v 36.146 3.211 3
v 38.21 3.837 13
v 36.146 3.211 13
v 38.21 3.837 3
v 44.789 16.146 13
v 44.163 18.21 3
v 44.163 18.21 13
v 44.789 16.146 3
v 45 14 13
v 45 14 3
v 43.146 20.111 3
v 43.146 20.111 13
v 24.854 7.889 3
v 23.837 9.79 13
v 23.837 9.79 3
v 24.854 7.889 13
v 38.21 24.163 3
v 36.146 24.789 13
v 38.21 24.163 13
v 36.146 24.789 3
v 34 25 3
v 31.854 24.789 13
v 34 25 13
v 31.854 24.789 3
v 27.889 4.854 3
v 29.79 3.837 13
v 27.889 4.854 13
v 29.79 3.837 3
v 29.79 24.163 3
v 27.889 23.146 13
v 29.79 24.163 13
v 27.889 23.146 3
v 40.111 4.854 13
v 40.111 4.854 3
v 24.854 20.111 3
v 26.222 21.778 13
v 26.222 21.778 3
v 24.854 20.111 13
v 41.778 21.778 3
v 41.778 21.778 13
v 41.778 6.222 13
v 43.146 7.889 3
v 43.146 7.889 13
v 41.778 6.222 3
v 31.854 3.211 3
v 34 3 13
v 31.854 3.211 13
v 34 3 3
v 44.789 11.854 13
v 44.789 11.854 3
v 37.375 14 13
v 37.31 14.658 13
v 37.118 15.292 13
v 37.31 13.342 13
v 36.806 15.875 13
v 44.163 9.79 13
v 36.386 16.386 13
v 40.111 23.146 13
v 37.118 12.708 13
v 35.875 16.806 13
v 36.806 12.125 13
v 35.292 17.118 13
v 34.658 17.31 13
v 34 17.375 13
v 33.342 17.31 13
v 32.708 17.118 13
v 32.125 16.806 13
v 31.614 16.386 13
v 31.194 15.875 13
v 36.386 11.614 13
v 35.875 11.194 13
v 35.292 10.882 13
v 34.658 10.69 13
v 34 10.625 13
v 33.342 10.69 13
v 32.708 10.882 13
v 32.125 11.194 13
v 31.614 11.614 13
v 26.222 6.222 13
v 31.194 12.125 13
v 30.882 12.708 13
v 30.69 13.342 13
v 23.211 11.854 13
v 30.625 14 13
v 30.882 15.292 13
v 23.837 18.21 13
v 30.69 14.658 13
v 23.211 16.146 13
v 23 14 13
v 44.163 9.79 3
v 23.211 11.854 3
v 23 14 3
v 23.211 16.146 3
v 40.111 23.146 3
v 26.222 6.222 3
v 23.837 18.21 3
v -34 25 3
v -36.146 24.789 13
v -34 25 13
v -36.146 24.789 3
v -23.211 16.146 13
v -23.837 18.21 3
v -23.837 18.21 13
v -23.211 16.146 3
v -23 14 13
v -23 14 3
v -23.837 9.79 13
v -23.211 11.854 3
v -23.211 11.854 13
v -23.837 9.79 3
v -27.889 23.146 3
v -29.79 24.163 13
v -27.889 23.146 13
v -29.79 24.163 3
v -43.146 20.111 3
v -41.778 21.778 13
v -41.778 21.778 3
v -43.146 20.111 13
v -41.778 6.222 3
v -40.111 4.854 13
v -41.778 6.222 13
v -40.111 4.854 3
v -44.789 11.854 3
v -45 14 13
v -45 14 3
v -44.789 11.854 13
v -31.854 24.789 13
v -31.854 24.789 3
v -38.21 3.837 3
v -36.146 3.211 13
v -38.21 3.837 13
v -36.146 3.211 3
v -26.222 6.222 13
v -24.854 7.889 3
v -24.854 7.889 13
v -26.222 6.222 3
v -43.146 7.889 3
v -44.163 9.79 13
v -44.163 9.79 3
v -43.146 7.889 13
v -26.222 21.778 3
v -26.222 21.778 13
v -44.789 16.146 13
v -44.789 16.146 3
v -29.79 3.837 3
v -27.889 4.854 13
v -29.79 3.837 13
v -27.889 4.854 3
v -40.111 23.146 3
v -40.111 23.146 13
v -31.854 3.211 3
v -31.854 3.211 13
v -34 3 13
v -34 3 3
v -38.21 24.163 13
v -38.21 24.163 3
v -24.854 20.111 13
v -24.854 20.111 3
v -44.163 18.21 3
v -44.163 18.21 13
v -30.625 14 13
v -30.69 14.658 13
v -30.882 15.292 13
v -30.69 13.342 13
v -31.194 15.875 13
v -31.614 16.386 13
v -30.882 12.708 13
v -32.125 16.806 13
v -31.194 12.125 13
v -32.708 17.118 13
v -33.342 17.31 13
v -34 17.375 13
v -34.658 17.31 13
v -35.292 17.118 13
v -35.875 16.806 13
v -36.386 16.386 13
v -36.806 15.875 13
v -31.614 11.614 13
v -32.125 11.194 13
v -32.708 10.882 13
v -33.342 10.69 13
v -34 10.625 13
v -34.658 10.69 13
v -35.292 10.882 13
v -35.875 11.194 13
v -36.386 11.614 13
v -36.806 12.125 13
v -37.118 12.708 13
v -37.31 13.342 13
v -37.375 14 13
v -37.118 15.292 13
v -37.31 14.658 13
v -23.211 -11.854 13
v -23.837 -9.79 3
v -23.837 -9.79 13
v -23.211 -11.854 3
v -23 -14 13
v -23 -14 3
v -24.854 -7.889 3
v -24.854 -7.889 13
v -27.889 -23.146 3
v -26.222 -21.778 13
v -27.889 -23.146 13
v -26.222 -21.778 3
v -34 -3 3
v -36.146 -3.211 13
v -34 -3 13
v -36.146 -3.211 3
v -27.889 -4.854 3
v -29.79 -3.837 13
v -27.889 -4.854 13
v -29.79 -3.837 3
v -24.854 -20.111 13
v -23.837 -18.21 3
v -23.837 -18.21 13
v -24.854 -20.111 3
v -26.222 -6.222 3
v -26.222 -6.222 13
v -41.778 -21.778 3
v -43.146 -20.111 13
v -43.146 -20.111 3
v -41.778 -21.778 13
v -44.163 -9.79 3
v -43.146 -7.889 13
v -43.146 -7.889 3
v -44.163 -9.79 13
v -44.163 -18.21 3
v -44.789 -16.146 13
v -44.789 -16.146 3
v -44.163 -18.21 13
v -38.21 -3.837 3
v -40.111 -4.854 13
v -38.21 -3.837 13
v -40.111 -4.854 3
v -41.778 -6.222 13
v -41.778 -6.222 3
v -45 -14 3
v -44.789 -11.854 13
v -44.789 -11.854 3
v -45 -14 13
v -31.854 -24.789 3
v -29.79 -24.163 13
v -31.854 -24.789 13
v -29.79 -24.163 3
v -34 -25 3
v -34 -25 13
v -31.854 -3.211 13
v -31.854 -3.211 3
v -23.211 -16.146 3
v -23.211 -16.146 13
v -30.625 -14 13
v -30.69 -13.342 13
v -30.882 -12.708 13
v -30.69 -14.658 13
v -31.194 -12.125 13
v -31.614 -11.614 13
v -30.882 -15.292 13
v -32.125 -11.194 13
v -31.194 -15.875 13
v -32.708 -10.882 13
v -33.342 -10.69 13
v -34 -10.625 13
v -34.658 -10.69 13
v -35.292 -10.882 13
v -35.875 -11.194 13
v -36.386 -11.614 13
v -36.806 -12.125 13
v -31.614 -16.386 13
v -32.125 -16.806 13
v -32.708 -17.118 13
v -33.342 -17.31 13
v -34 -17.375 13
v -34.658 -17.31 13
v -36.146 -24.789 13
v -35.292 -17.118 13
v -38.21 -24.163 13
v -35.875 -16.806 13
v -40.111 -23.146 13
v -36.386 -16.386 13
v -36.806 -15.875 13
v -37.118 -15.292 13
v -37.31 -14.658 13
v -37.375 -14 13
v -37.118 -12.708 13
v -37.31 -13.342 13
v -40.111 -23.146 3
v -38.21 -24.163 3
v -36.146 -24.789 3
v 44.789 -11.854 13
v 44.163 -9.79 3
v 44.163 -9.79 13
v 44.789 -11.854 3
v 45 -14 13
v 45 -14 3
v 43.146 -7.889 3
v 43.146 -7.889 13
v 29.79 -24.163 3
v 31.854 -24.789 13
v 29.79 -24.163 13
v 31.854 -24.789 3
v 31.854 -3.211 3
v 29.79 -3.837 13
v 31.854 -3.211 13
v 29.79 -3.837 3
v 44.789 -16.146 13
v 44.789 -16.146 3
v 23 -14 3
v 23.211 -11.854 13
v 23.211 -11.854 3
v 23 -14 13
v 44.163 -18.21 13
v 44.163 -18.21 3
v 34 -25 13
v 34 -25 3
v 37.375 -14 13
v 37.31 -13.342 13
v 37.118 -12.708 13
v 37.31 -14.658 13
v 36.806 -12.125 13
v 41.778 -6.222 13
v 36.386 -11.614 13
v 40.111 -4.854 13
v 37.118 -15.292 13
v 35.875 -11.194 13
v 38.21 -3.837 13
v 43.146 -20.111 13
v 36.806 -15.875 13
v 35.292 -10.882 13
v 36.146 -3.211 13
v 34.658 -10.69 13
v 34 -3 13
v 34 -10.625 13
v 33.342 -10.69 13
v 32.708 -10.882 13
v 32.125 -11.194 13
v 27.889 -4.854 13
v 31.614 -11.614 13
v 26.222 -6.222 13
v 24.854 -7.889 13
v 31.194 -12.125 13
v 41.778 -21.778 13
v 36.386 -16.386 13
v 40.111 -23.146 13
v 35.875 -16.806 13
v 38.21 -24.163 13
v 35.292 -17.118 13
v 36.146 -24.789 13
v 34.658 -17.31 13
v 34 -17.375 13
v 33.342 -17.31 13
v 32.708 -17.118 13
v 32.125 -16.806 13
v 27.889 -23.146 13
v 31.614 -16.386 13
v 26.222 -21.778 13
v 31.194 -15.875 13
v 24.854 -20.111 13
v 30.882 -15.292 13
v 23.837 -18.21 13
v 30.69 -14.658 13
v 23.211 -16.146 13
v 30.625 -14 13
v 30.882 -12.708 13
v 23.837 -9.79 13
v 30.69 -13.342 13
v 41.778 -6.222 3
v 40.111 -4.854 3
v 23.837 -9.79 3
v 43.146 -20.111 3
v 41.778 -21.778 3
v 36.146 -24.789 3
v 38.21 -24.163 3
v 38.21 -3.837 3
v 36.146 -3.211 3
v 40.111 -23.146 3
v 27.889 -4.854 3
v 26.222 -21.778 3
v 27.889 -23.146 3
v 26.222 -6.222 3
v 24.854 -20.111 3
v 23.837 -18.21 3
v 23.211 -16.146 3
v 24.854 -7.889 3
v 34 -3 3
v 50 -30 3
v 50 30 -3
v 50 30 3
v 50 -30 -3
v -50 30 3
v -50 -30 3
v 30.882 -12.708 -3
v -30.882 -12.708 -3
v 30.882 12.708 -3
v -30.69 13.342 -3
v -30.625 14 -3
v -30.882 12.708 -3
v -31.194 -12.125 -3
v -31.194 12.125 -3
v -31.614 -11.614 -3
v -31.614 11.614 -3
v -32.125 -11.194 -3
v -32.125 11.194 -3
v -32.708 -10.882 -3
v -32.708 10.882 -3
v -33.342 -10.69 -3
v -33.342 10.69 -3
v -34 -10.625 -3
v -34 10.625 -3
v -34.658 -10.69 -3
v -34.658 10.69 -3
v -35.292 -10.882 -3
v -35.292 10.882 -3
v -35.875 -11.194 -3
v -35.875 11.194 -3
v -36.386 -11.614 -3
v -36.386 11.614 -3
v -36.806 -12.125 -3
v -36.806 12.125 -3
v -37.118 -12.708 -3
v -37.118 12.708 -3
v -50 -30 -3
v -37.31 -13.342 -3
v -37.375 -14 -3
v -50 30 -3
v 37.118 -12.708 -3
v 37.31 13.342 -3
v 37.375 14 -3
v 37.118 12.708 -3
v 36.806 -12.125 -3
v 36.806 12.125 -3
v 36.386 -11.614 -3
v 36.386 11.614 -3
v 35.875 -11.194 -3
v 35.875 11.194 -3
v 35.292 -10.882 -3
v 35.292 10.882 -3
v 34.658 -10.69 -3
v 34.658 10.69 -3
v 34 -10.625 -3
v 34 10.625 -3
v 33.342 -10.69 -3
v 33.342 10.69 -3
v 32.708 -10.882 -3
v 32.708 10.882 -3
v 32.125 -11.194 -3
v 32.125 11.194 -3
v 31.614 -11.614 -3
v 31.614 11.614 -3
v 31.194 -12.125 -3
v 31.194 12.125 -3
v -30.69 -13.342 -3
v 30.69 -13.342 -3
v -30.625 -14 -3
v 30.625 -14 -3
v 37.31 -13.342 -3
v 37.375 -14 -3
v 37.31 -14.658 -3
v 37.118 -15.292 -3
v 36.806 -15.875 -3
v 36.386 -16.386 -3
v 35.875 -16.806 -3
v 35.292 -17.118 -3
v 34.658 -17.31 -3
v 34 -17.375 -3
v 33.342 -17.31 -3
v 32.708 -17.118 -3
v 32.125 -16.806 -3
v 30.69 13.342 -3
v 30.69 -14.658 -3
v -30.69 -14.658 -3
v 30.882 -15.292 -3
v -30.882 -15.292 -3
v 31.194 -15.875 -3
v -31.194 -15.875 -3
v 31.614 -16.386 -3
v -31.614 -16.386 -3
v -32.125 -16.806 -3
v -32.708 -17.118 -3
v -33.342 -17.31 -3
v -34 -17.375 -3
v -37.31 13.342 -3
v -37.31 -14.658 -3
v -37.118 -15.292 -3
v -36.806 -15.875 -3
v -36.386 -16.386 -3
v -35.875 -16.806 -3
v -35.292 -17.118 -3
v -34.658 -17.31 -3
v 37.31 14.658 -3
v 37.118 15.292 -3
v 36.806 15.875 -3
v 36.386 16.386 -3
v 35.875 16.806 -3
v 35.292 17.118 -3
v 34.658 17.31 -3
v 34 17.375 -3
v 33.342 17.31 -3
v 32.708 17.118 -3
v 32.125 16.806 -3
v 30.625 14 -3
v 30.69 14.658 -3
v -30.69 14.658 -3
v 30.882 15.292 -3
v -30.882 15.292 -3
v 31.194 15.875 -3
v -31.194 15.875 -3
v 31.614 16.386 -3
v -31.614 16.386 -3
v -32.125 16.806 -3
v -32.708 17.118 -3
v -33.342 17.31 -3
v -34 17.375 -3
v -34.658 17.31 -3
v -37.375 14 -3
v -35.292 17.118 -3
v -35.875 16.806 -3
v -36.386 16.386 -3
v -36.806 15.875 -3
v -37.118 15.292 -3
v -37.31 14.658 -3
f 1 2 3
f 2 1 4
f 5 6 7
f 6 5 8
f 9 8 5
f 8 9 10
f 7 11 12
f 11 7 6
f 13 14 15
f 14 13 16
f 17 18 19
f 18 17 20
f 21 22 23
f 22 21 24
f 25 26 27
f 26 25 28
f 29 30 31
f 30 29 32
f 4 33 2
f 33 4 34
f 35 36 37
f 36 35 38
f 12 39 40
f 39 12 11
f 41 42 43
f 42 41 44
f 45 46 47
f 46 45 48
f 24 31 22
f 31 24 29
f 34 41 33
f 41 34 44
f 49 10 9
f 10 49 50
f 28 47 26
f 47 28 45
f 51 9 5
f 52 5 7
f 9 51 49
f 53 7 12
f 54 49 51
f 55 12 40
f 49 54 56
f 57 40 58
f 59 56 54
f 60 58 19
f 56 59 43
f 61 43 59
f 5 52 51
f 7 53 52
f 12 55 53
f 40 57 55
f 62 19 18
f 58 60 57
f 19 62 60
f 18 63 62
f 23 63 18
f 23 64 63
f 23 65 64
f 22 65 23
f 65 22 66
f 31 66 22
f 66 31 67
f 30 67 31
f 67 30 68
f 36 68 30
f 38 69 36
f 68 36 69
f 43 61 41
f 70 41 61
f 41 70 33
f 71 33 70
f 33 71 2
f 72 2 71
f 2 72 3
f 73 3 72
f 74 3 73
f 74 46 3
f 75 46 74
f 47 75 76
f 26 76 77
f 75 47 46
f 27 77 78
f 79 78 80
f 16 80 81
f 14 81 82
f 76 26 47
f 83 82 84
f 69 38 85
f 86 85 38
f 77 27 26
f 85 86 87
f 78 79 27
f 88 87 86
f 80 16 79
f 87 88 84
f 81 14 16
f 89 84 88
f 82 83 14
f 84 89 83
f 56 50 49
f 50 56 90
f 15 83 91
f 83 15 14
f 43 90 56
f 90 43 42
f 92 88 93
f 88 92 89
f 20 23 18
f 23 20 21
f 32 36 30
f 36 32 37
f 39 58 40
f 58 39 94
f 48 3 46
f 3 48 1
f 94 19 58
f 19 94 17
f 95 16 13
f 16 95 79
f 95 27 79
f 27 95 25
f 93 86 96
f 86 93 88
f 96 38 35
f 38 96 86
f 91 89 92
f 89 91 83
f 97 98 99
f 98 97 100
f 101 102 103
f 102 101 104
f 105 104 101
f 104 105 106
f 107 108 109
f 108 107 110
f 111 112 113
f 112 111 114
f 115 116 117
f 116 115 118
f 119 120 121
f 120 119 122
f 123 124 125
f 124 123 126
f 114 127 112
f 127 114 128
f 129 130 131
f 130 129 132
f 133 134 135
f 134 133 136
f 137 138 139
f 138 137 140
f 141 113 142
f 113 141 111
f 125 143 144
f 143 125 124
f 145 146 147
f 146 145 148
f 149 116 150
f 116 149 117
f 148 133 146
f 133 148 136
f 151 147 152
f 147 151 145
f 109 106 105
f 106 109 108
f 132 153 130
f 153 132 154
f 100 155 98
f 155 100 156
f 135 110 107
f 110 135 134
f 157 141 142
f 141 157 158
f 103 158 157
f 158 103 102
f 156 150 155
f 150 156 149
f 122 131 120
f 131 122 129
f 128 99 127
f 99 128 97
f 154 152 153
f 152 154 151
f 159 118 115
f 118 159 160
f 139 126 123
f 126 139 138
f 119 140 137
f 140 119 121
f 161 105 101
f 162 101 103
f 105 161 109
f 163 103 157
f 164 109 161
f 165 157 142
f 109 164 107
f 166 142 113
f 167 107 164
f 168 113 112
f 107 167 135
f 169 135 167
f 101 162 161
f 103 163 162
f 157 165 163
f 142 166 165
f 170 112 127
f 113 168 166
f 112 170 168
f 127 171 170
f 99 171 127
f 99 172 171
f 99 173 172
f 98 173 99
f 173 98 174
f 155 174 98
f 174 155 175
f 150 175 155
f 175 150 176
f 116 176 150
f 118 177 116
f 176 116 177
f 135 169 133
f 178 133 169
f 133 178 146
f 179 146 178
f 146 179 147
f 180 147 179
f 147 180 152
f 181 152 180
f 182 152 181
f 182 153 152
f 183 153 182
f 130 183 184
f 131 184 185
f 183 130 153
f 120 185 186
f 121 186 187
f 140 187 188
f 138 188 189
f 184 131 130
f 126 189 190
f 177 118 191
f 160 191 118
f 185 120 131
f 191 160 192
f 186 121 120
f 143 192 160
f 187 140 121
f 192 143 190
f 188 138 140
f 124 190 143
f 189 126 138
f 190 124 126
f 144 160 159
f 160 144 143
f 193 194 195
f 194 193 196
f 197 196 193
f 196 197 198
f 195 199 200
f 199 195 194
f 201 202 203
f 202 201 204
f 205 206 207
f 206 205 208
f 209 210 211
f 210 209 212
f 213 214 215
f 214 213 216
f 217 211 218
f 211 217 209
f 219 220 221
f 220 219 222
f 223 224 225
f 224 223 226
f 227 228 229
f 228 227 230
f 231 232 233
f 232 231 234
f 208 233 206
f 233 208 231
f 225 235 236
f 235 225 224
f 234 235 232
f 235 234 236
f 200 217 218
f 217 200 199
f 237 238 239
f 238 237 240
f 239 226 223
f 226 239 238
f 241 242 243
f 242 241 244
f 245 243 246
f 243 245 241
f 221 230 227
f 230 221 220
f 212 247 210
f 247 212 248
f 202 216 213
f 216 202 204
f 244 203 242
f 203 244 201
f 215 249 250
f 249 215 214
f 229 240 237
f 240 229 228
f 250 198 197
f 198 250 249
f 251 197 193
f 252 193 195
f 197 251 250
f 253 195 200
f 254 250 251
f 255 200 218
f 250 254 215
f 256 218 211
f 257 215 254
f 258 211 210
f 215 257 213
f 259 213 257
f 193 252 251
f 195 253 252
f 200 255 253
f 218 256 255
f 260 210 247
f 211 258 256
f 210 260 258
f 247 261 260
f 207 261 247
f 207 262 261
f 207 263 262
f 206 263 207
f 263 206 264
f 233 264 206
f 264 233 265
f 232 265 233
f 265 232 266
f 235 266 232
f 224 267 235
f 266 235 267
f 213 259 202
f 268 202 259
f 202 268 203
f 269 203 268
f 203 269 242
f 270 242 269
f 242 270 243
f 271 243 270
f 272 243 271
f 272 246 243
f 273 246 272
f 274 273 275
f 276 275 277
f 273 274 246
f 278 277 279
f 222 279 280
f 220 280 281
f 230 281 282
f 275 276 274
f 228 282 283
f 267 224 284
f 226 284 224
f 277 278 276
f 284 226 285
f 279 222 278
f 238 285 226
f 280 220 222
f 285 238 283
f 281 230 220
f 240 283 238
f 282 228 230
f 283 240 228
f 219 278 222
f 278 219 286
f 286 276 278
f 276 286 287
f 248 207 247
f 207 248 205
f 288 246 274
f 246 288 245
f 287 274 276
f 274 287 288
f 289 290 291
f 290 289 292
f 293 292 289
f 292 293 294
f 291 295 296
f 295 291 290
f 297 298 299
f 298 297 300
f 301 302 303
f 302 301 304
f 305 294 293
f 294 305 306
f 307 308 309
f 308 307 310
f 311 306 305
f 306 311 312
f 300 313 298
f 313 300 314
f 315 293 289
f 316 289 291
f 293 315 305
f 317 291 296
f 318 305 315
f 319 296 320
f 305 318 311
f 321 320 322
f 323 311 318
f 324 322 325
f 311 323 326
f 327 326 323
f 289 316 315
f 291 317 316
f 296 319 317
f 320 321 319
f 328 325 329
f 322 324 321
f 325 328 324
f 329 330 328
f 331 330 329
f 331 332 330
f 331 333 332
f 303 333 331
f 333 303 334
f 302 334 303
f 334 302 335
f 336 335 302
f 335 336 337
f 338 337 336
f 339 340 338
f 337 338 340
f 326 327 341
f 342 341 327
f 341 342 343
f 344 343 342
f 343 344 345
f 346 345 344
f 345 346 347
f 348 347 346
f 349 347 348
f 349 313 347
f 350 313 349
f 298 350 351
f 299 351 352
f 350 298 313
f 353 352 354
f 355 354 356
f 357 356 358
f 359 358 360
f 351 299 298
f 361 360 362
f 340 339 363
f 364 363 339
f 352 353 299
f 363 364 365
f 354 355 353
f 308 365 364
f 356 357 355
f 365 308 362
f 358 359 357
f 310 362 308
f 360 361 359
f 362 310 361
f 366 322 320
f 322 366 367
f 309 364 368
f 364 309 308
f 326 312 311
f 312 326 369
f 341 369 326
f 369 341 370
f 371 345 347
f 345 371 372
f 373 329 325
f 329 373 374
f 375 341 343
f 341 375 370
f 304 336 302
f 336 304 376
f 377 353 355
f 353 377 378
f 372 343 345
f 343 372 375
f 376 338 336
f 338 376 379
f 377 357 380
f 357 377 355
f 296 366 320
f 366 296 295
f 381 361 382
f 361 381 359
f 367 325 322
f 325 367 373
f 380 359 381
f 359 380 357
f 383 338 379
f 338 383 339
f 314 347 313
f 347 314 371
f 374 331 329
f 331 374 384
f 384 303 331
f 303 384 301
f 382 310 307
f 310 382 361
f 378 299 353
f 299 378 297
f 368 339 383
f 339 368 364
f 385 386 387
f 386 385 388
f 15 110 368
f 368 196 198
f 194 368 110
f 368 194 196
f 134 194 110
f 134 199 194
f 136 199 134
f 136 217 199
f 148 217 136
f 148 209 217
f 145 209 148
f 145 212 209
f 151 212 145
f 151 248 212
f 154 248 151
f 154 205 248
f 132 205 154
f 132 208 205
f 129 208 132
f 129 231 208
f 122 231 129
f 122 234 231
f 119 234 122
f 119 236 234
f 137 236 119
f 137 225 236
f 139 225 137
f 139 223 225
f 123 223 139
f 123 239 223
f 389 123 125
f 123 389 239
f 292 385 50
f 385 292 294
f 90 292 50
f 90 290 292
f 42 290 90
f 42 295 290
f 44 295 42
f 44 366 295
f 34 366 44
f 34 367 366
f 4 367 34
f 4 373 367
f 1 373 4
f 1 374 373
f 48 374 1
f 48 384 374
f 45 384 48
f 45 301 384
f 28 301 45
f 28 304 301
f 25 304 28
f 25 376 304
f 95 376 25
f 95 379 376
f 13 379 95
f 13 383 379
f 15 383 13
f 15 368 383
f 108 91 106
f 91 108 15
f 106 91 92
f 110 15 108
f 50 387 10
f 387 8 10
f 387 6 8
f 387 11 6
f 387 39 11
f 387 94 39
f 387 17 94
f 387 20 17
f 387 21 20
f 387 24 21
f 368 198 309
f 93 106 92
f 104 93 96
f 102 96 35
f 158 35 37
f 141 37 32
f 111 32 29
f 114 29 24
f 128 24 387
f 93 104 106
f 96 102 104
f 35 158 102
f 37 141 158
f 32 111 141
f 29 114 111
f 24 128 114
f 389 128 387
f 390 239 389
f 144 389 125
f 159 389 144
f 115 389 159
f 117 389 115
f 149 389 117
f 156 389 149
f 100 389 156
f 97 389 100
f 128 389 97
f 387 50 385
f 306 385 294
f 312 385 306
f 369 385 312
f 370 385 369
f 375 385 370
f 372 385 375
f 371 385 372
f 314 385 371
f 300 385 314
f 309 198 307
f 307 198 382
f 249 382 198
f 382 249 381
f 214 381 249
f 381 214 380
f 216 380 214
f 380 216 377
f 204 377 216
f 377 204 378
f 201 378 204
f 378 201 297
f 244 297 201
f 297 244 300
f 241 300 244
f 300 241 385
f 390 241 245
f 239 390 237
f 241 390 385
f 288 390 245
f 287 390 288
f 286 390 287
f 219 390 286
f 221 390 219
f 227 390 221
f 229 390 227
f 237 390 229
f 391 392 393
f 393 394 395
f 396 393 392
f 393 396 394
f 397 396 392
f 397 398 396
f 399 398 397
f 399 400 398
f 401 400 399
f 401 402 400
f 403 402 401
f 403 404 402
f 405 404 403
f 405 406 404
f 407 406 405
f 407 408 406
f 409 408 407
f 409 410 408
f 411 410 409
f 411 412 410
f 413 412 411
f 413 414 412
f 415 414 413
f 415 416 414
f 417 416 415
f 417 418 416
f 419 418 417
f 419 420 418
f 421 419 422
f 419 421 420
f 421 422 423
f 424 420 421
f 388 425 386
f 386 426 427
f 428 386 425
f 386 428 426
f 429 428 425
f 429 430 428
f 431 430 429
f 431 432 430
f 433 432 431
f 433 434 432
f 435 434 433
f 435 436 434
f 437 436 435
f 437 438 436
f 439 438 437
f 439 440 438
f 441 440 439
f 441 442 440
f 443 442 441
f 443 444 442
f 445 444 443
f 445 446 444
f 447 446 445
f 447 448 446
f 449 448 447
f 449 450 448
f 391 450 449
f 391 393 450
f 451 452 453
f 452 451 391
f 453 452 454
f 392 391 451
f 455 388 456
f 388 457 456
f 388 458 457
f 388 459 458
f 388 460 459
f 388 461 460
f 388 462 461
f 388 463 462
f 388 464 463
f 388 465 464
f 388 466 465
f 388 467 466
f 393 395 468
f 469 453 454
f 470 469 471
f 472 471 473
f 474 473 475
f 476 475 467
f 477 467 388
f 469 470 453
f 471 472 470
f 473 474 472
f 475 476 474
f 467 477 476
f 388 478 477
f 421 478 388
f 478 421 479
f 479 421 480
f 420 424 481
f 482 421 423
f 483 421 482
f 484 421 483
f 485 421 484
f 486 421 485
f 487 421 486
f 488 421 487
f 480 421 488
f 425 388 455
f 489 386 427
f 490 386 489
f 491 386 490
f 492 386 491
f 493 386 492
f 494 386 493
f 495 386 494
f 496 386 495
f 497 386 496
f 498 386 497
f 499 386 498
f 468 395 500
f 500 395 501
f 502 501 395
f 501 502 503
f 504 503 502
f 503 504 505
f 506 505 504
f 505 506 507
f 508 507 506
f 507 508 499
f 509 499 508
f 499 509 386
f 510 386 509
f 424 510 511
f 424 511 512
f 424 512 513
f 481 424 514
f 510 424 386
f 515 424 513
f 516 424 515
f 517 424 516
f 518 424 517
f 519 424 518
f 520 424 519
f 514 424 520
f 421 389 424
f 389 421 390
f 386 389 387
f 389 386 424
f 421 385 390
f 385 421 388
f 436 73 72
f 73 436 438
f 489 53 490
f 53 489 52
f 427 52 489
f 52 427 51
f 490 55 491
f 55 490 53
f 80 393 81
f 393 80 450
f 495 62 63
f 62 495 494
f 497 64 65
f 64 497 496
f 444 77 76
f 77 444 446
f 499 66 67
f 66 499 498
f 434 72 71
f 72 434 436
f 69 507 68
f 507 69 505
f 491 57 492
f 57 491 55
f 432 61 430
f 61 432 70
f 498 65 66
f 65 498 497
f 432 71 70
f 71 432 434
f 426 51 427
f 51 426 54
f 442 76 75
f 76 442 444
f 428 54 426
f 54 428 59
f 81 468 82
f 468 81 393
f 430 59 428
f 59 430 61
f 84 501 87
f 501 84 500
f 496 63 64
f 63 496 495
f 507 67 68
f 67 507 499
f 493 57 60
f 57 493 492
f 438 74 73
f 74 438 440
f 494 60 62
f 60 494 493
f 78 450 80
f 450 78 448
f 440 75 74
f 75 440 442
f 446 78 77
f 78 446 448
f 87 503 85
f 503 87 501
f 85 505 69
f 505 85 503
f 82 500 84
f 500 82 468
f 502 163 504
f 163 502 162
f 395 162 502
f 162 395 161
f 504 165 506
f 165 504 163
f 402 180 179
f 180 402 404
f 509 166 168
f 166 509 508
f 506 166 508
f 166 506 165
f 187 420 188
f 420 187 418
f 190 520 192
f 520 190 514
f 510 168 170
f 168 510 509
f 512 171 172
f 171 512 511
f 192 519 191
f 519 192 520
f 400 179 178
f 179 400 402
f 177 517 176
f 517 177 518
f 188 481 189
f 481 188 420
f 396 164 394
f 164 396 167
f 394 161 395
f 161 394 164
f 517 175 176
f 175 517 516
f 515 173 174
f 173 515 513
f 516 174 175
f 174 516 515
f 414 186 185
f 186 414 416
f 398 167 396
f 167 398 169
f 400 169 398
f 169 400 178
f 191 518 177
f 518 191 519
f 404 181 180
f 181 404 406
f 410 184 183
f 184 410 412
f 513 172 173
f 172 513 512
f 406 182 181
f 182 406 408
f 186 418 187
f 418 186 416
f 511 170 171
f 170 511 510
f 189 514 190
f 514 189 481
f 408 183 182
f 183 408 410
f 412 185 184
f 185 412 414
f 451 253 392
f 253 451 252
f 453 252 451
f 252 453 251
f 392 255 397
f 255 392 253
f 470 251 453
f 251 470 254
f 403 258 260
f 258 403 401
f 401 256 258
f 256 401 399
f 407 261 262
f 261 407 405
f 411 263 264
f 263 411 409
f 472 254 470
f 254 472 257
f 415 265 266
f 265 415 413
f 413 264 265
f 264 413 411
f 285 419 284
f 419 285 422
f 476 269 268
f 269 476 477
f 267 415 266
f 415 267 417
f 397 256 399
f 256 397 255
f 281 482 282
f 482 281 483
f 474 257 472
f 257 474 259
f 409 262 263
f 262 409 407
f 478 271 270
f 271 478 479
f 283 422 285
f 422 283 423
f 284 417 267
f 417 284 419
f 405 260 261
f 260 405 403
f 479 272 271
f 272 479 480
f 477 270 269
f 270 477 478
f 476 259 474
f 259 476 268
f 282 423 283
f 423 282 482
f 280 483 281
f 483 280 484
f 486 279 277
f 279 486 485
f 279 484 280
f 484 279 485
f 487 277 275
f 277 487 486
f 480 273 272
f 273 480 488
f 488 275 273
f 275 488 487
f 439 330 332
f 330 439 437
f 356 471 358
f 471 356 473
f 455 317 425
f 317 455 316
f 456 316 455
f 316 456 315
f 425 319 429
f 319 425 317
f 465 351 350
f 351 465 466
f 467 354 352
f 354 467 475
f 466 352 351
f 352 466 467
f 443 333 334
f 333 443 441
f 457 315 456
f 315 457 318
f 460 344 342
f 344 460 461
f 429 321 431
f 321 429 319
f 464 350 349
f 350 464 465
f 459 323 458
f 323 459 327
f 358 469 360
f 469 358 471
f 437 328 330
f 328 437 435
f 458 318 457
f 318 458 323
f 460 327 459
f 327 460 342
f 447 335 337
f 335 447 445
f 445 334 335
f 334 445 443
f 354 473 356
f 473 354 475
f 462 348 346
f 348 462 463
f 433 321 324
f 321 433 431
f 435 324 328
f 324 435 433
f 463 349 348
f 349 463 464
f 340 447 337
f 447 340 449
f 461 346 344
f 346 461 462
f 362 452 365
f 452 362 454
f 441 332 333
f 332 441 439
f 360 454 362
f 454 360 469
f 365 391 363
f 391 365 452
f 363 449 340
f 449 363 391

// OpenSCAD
$fn = 32;

// ----------------------------------------------------------------------
// Anchor pads 100 x 60 x 16
// four corner bosses with anchor holes
// ----------------------------------------------------------------------

// --- parameters (mm) ---
plate = [100, 60, 6];    // base plate size (x, y, z)
seat_tol = 0.05;         // tolerance at the seating features
free_tol = 0.3;          // general tolerance on the free sizes
pads = 4;                // boss count, one per corner
edge = 16;               // boss centre offset from the plate edge
boss_d = 22;             // boss diameter
boss_h = 10;             // boss height above the base plate
bore_d = 6.6;            // nominal hole diameter from the drawing
print_allowance = 0.15;  // clearance added for printing

// --- derived feature positions (mm) ---
hole_d = bore_d + print_allowance;  // = 6.75   hole diameter as printed
height = plate[2] + boss_h;         // = 16   overall height of the part
corner_x = plate[0] / 2 - edge;     // = 34   boss centre X
corner_y = plate[1] / 2 - edge;     // = 14   boss centre Y
feature_centers = [
  [corner_x, corner_y],
  [-corner_x, corner_y],
  [-corner_x, -corner_y],
  [corner_x, -corner_y]
];   // boss centres, anchor holes are drilled there

// base plate, four bosses standing on it, anchor holes all the way through
difference() {
  union() {
    cube(plate, center = true);
    for (centre = feature_centers)
      translate([centre[0], centre[1], plate[2] / 2 - 1])
        cylinder(d = boss_d, h = boss_h + 1);
  }
  for (centre = feature_centers)
    translate([centre[0], centre[1], -height])
      cylinder(d = hole_d, h = 2 * height + 2);  // through boss and plate
}
